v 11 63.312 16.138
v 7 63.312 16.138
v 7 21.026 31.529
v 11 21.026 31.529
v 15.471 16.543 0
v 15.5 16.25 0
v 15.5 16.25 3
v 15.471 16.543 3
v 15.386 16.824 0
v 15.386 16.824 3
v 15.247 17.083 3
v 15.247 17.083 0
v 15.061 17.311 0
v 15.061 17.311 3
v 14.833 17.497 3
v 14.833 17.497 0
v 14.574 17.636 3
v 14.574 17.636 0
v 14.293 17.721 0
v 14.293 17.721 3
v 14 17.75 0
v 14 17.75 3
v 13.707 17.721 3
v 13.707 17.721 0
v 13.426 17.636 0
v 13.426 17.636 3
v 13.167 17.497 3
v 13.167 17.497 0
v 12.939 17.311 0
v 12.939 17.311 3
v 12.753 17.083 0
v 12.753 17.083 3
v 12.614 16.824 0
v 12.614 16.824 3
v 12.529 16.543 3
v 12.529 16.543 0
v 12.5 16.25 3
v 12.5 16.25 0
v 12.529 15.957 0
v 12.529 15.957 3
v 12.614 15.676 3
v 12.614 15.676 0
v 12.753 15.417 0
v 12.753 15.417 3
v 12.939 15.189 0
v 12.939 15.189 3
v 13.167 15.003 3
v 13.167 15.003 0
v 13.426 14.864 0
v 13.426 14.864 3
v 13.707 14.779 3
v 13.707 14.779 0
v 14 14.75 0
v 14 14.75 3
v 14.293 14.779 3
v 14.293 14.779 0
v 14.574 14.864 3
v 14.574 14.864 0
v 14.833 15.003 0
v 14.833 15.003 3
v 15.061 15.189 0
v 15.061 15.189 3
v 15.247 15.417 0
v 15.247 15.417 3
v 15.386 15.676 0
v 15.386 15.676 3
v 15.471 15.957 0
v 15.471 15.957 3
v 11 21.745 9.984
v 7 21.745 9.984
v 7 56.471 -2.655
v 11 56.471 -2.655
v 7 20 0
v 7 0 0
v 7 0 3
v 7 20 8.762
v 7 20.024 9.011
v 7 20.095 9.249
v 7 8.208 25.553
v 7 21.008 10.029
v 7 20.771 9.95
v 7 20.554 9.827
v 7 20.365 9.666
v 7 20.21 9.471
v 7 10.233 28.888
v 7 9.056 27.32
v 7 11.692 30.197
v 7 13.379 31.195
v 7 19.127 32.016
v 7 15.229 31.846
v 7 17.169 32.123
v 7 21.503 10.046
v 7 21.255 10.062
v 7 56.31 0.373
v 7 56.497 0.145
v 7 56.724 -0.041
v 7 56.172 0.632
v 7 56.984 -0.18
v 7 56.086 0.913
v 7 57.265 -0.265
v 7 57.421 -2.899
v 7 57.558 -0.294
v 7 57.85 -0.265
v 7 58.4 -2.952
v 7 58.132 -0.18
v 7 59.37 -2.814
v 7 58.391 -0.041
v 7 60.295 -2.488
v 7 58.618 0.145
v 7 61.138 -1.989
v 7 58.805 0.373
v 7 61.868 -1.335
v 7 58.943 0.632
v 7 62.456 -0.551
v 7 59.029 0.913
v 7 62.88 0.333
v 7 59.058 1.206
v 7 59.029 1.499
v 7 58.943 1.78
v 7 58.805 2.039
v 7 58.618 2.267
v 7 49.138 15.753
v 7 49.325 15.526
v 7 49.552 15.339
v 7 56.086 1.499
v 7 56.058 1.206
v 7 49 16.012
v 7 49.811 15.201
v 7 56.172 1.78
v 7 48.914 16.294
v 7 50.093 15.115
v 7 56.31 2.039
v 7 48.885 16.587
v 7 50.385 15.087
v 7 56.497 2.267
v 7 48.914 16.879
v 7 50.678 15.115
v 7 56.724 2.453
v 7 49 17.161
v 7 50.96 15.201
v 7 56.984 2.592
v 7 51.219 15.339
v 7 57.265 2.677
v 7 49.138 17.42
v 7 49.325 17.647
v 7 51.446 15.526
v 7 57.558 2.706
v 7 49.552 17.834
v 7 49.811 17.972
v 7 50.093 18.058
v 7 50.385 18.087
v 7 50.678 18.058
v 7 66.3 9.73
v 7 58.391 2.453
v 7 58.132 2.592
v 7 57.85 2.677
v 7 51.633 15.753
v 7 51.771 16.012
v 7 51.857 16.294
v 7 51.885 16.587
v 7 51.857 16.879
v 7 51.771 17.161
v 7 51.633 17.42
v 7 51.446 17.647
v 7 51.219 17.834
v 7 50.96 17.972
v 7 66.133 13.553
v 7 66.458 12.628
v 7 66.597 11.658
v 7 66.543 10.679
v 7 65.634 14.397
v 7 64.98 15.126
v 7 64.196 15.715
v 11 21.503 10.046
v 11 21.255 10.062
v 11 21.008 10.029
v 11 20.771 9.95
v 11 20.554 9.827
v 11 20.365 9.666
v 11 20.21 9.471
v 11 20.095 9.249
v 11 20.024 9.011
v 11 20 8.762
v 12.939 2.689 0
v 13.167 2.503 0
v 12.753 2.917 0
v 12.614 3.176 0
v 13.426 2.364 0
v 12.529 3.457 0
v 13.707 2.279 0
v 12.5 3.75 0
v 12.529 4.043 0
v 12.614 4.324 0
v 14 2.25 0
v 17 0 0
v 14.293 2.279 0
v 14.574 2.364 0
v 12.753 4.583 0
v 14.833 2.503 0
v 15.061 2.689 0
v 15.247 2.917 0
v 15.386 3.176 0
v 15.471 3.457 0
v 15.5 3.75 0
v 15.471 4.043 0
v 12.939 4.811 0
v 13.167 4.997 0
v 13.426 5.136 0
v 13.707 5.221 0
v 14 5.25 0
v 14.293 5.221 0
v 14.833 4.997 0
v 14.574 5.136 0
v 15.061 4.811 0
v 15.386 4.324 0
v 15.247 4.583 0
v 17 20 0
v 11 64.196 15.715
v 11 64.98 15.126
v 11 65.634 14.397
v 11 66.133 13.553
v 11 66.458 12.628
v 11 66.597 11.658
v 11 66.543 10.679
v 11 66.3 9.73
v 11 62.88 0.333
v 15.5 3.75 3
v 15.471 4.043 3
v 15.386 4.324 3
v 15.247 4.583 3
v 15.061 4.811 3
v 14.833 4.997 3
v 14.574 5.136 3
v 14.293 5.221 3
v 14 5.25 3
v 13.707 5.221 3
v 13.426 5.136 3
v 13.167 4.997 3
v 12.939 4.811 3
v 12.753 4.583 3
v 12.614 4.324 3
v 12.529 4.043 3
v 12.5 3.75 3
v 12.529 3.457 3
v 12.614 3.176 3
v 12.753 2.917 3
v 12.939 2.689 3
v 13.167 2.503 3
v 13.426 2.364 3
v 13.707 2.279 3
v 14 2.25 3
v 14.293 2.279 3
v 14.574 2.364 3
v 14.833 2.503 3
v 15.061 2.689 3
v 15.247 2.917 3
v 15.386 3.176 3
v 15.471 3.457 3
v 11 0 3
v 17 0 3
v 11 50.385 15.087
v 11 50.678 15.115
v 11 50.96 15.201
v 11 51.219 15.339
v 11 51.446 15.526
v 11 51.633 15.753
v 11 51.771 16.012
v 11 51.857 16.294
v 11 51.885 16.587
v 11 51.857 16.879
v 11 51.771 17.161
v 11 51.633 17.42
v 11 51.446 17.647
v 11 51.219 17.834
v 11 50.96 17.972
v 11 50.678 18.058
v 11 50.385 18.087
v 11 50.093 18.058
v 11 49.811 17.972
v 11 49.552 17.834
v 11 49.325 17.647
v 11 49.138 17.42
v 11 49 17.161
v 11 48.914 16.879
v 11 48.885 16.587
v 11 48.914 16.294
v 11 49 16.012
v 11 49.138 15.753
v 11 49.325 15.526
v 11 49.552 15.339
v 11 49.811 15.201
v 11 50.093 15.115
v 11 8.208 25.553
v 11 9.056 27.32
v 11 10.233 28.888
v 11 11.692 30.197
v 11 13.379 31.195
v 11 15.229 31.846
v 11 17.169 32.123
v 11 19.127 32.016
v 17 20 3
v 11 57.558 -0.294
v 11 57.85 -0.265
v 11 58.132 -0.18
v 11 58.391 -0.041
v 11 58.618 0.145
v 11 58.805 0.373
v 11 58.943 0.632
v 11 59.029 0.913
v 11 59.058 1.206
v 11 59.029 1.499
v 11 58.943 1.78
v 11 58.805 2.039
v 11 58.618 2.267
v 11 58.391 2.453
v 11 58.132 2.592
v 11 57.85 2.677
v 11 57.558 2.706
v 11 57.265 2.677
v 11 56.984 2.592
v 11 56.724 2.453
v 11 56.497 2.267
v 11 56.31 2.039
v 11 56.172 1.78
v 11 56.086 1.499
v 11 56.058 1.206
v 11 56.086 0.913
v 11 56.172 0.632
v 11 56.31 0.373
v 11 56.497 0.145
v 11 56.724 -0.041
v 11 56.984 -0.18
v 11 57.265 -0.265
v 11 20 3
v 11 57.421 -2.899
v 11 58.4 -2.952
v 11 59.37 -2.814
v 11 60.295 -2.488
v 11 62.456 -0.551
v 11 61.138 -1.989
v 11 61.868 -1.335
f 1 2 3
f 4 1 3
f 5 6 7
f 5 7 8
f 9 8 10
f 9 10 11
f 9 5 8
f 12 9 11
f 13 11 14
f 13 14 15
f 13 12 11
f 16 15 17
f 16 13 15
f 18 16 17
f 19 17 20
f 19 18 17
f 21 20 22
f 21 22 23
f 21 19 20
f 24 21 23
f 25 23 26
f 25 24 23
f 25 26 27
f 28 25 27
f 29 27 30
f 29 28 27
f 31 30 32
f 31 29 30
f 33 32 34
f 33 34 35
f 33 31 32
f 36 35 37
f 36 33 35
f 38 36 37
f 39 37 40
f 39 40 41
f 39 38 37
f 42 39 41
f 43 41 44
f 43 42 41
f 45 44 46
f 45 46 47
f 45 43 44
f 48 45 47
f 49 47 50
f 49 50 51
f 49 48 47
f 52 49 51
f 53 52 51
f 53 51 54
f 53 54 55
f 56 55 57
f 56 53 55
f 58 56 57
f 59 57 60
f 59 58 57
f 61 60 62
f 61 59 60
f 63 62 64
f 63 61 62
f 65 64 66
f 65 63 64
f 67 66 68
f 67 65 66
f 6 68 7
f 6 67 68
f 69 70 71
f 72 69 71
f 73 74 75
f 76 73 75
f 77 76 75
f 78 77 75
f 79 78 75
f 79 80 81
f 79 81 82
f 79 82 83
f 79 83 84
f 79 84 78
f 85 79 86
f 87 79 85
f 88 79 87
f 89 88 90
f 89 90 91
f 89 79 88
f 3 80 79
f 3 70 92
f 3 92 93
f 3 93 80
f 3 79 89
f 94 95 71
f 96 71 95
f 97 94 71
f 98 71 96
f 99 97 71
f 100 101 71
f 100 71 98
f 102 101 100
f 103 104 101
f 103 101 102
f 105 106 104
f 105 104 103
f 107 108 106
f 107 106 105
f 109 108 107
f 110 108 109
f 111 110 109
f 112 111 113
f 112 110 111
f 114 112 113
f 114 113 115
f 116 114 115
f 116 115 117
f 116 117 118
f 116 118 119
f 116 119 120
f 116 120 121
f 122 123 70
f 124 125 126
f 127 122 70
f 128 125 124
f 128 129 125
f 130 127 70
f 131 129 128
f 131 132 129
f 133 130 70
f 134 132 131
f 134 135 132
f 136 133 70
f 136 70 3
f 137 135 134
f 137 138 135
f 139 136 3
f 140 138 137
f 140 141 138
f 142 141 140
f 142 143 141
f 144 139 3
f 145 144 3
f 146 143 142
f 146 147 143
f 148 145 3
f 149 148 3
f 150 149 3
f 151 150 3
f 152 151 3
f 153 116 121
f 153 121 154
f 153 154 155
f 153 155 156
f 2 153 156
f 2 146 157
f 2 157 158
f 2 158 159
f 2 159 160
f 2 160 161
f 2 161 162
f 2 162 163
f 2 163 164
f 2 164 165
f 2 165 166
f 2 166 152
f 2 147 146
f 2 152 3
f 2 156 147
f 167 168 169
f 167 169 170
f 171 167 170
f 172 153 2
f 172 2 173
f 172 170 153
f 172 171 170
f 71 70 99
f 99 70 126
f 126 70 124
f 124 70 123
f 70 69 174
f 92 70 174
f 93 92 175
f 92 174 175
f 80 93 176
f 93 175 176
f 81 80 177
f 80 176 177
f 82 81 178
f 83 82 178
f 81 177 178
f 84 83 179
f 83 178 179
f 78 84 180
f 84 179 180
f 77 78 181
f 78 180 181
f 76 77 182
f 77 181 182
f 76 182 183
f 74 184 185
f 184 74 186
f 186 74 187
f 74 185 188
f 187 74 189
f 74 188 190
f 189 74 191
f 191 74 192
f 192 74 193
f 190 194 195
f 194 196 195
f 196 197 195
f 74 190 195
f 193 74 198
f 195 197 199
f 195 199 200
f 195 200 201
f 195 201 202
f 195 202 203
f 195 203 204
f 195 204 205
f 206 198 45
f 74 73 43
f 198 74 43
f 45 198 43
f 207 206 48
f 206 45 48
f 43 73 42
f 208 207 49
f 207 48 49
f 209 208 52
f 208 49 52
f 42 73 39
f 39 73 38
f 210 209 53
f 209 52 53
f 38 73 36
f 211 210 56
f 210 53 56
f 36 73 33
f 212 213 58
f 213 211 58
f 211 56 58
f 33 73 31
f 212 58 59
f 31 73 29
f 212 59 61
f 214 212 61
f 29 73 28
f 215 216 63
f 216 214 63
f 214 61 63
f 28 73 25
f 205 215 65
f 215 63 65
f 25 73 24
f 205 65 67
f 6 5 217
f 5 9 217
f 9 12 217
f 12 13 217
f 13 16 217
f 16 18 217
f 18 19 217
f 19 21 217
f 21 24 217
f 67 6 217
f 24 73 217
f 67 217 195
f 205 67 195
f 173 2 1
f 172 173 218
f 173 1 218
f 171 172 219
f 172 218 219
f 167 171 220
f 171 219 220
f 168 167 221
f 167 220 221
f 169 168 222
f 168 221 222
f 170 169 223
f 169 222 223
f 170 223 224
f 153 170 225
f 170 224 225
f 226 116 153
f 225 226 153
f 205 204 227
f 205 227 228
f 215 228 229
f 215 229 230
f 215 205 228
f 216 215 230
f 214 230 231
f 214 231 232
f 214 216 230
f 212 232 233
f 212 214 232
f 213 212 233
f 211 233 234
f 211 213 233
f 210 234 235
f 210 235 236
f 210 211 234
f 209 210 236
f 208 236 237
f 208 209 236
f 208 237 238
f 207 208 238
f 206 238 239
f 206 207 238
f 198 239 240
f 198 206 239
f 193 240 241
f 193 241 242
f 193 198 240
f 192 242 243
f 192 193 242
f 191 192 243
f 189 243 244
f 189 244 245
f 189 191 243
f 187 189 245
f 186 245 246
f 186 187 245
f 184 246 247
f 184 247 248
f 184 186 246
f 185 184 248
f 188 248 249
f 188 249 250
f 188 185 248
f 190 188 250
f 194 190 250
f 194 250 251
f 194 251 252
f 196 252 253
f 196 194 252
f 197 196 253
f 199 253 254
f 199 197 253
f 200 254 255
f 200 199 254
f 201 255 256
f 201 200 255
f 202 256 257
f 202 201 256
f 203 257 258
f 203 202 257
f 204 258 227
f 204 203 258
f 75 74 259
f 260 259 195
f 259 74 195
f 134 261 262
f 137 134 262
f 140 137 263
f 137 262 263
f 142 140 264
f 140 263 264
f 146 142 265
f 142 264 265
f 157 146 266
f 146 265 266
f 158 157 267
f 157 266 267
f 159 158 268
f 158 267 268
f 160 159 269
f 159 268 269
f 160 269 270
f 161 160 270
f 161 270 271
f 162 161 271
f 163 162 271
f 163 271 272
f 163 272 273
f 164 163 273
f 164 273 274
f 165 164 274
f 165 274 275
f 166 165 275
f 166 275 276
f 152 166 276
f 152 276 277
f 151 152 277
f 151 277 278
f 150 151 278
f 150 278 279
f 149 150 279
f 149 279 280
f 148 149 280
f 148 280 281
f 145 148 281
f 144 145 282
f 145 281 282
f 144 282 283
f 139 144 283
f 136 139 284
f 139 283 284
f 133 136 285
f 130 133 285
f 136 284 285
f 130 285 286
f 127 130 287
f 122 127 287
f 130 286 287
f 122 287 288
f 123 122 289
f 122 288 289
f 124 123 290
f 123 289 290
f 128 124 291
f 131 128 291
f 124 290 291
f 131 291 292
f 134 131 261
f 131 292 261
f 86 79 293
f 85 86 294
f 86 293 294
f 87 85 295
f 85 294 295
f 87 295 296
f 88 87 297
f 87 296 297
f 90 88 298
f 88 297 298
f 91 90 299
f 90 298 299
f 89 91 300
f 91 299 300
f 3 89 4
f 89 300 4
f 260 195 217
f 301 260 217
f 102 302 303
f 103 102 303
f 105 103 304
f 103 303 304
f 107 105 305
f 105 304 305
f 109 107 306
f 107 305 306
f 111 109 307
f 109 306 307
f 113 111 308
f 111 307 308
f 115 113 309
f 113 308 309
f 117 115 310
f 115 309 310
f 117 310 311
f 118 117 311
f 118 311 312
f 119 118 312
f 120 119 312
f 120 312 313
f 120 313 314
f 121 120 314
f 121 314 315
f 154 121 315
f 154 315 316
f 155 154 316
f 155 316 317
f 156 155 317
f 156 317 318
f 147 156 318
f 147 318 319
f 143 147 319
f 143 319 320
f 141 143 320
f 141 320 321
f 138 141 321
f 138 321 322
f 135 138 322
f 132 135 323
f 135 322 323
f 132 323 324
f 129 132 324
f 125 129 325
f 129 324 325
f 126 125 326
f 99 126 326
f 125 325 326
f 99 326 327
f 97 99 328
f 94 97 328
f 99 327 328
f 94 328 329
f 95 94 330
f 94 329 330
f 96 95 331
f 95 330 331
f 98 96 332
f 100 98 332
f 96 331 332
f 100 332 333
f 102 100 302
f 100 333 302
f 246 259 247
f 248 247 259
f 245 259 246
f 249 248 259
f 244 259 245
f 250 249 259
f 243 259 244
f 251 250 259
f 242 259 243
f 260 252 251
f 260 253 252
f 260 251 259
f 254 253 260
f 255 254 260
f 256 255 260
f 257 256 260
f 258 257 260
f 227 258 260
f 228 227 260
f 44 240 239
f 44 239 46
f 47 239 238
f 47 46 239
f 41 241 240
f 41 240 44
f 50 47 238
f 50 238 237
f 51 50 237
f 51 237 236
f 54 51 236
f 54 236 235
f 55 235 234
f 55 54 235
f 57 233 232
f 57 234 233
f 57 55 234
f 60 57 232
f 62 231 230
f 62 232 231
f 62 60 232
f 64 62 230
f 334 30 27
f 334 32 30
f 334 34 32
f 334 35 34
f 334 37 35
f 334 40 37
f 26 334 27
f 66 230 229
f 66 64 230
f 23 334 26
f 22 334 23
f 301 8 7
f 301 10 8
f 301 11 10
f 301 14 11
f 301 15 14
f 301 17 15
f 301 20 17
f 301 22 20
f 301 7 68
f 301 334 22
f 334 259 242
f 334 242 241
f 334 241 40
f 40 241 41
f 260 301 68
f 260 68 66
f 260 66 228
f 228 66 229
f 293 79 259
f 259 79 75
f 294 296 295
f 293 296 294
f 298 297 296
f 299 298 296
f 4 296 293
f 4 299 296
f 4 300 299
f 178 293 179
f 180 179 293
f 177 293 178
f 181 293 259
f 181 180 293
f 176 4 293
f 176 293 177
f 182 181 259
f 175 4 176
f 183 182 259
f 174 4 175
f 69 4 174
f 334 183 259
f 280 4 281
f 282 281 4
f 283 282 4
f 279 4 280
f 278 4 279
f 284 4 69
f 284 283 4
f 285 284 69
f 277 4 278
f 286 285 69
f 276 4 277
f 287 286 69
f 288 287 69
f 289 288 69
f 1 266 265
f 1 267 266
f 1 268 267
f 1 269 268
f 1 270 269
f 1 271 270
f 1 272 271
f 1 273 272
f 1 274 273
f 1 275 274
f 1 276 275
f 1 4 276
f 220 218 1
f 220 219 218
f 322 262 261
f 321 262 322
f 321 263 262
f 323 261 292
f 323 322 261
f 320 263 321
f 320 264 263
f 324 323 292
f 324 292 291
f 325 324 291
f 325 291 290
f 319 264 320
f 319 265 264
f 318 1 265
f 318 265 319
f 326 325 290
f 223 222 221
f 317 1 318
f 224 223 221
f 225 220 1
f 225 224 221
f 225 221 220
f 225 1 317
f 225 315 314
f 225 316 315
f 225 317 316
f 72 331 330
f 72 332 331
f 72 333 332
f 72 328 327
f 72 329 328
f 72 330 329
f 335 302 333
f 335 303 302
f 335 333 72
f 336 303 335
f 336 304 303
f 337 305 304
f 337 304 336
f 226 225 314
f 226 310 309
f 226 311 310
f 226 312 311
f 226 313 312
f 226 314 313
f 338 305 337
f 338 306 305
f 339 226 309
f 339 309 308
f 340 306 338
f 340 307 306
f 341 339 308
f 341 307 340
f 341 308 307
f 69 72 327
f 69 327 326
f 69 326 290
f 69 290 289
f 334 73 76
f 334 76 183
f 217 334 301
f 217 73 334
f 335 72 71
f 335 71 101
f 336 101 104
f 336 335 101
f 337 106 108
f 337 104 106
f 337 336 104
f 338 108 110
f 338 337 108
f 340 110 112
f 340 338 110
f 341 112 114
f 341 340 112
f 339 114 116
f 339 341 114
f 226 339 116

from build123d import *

# Parameters (mm, degrees)
SKETCH_1_W          = 17
SKETCH_1_H          = 20
SKETCH_1_R          = 1.5
EXTRUDE_1_DEPTH     = 3
EXTRUDE_2_DEPTH     = 5
SKETCH_4_R          = 1.5
CUT_EXTRUDE_1_DEPTH = 5
FILLET_2_R          = 5
FILLET_3_R          = 1.3
FILLET_4_R          = 10
SKETCH_5_W          = 6
SKETCH_5_H          = 20
CUT_EXTRUDE_2_DEPTH = 10
SKETCH_6_R          = 1.5
CUT_EXTRUDE_3_DEPTH = 1


with BuildPart() as part:
    # 草图1 → 凸台-拉伸1 (new body)
    with BuildSketch(Plane.XY):
        with Locations((8.5, 10)):
            Rectangle(SKETCH_1_W, SKETCH_1_H)
        with Locations((3, 16.25)):
            Circle(SKETCH_1_R, mode=Mode.SUBTRACT)
        with Locations((14, 16.25)):
            Circle(SKETCH_1_R, mode=Mode.SUBTRACT)
        with Locations((14, 3.75)):
            Circle(SKETCH_1_R, mode=Mode.SUBTRACT)
        with Locations((3, 3.75)):
            Circle(SKETCH_1_R, mode=Mode.SUBTRACT)
    extrude(amount=EXTRUDE_1_DEPTH)

    # 草图3 → 凸台-拉伸2 (add)
    with BuildSketch(Plane.ZY.offset(-6)):
        Polygon((3, 20), (10.619084129, 20), (-4.365511909, 61.169839254), (14.428340507, 68.01024212), (34.949549107, 11.628684873), (3, 0), align=None)
    extrude(amount=-EXTRUDE_2_DEPTH)

    # 草图4 → 切除-拉伸1 (cut)
    with BuildSketch(Plane(origin=(11, 0, 0), x_dir=(0, 0, -1), z_dir=(1, 0, 0))):
        with Locations((-16.586518504, 50.385479207)):
            Circle(SKETCH_4_R)
        with Locations((-1.205965334, 57.557548937)):
            Circle(SKETCH_4_R)
    extrude(amount=-CUT_EXTRUDE_1_DEPTH, mode=Mode.SUBTRACT)

    # 圆角2
    fillet_2_edges = [part.edges().sort_by_distance(p)[0] for p in [
        (8.5, 61.169839254, -4.365511909),
        (8.5, 68.01024212, 14.428340507),
    ]]
    fillet(fillet_2_edges, radius=FILLET_2_R)

    # 圆角3
    fillet_3_edges = [part.edges().sort_by_distance(p)[0] for p in [
        (8.5, 20, 10.619084129),
    ]]
    fillet(fillet_3_edges, radius=FILLET_3_R)

    # 圆角4
    fillet_4_edges = [part.edges().sort_by_distance(p)[0] for p in [
        (8.5, 11.628684873, 34.949549107),
    ]]
    fillet(fillet_4_edges, radius=FILLET_4_R)

    # 草图5 → 切除-拉伸2 (cut)
    with BuildSketch(Plane.XY.offset(3)):
        with Locations((3, 10)):
            Rectangle(SKETCH_5_W, SKETCH_5_H)
    extrude(amount=-CUT_EXTRUDE_2_DEPTH, mode=Mode.SUBTRACT)

    # 草图6 → 切除-拉伸3 (cut)
    with BuildSketch(Plane.ZY.offset(-6)):
        with BuildLine():
            Line((3, 0), (25.552622899, 8.20848344))
            ThreePointArc((25.552622899, 8.20848344), (31.195499336, 13.37922703), (31.529347673, 21.025611081))
            Line((31.529347673, 21.025611081), (16.138441224, 63.311779016))
            ThreePointArc((16.138441224, 63.311779016), (13.553069429, 66.133217235), (9.729877403, 66.300141404))
            Line((9.729877403, 66.300141404), (0.332951195, 62.87993997))
            ThreePointArc((0.332951195, 62.87993997), (-2.488487023, 60.294568175), (-2.655411192, 56.47137615))
            Line((-2.655411192, 56.47137615), (9.984092128, 21.744626186))
            ThreePointArc((9.984092128, 21.744626186), (9.827389378, 20.554350633), (8.762491721, 20))
            Line((8.762491721, 20), (0, 20))
            Line((0, 20), (0, 0))
            Line((0, 0), (3, 0))
        make_face()
        with Locations((16.586518504, 50.385479207)):
            Circle(SKETCH_6_R, mode=Mode.SUBTRACT)
        with Locations((1.205965334, 57.557548937)):
            Circle(SKETCH_6_R, mode=Mode.SUBTRACT)
    extrude(amount=-CUT_EXTRUDE_3_DEPTH, mode=Mode.SUBTRACT)


solid = part.part
